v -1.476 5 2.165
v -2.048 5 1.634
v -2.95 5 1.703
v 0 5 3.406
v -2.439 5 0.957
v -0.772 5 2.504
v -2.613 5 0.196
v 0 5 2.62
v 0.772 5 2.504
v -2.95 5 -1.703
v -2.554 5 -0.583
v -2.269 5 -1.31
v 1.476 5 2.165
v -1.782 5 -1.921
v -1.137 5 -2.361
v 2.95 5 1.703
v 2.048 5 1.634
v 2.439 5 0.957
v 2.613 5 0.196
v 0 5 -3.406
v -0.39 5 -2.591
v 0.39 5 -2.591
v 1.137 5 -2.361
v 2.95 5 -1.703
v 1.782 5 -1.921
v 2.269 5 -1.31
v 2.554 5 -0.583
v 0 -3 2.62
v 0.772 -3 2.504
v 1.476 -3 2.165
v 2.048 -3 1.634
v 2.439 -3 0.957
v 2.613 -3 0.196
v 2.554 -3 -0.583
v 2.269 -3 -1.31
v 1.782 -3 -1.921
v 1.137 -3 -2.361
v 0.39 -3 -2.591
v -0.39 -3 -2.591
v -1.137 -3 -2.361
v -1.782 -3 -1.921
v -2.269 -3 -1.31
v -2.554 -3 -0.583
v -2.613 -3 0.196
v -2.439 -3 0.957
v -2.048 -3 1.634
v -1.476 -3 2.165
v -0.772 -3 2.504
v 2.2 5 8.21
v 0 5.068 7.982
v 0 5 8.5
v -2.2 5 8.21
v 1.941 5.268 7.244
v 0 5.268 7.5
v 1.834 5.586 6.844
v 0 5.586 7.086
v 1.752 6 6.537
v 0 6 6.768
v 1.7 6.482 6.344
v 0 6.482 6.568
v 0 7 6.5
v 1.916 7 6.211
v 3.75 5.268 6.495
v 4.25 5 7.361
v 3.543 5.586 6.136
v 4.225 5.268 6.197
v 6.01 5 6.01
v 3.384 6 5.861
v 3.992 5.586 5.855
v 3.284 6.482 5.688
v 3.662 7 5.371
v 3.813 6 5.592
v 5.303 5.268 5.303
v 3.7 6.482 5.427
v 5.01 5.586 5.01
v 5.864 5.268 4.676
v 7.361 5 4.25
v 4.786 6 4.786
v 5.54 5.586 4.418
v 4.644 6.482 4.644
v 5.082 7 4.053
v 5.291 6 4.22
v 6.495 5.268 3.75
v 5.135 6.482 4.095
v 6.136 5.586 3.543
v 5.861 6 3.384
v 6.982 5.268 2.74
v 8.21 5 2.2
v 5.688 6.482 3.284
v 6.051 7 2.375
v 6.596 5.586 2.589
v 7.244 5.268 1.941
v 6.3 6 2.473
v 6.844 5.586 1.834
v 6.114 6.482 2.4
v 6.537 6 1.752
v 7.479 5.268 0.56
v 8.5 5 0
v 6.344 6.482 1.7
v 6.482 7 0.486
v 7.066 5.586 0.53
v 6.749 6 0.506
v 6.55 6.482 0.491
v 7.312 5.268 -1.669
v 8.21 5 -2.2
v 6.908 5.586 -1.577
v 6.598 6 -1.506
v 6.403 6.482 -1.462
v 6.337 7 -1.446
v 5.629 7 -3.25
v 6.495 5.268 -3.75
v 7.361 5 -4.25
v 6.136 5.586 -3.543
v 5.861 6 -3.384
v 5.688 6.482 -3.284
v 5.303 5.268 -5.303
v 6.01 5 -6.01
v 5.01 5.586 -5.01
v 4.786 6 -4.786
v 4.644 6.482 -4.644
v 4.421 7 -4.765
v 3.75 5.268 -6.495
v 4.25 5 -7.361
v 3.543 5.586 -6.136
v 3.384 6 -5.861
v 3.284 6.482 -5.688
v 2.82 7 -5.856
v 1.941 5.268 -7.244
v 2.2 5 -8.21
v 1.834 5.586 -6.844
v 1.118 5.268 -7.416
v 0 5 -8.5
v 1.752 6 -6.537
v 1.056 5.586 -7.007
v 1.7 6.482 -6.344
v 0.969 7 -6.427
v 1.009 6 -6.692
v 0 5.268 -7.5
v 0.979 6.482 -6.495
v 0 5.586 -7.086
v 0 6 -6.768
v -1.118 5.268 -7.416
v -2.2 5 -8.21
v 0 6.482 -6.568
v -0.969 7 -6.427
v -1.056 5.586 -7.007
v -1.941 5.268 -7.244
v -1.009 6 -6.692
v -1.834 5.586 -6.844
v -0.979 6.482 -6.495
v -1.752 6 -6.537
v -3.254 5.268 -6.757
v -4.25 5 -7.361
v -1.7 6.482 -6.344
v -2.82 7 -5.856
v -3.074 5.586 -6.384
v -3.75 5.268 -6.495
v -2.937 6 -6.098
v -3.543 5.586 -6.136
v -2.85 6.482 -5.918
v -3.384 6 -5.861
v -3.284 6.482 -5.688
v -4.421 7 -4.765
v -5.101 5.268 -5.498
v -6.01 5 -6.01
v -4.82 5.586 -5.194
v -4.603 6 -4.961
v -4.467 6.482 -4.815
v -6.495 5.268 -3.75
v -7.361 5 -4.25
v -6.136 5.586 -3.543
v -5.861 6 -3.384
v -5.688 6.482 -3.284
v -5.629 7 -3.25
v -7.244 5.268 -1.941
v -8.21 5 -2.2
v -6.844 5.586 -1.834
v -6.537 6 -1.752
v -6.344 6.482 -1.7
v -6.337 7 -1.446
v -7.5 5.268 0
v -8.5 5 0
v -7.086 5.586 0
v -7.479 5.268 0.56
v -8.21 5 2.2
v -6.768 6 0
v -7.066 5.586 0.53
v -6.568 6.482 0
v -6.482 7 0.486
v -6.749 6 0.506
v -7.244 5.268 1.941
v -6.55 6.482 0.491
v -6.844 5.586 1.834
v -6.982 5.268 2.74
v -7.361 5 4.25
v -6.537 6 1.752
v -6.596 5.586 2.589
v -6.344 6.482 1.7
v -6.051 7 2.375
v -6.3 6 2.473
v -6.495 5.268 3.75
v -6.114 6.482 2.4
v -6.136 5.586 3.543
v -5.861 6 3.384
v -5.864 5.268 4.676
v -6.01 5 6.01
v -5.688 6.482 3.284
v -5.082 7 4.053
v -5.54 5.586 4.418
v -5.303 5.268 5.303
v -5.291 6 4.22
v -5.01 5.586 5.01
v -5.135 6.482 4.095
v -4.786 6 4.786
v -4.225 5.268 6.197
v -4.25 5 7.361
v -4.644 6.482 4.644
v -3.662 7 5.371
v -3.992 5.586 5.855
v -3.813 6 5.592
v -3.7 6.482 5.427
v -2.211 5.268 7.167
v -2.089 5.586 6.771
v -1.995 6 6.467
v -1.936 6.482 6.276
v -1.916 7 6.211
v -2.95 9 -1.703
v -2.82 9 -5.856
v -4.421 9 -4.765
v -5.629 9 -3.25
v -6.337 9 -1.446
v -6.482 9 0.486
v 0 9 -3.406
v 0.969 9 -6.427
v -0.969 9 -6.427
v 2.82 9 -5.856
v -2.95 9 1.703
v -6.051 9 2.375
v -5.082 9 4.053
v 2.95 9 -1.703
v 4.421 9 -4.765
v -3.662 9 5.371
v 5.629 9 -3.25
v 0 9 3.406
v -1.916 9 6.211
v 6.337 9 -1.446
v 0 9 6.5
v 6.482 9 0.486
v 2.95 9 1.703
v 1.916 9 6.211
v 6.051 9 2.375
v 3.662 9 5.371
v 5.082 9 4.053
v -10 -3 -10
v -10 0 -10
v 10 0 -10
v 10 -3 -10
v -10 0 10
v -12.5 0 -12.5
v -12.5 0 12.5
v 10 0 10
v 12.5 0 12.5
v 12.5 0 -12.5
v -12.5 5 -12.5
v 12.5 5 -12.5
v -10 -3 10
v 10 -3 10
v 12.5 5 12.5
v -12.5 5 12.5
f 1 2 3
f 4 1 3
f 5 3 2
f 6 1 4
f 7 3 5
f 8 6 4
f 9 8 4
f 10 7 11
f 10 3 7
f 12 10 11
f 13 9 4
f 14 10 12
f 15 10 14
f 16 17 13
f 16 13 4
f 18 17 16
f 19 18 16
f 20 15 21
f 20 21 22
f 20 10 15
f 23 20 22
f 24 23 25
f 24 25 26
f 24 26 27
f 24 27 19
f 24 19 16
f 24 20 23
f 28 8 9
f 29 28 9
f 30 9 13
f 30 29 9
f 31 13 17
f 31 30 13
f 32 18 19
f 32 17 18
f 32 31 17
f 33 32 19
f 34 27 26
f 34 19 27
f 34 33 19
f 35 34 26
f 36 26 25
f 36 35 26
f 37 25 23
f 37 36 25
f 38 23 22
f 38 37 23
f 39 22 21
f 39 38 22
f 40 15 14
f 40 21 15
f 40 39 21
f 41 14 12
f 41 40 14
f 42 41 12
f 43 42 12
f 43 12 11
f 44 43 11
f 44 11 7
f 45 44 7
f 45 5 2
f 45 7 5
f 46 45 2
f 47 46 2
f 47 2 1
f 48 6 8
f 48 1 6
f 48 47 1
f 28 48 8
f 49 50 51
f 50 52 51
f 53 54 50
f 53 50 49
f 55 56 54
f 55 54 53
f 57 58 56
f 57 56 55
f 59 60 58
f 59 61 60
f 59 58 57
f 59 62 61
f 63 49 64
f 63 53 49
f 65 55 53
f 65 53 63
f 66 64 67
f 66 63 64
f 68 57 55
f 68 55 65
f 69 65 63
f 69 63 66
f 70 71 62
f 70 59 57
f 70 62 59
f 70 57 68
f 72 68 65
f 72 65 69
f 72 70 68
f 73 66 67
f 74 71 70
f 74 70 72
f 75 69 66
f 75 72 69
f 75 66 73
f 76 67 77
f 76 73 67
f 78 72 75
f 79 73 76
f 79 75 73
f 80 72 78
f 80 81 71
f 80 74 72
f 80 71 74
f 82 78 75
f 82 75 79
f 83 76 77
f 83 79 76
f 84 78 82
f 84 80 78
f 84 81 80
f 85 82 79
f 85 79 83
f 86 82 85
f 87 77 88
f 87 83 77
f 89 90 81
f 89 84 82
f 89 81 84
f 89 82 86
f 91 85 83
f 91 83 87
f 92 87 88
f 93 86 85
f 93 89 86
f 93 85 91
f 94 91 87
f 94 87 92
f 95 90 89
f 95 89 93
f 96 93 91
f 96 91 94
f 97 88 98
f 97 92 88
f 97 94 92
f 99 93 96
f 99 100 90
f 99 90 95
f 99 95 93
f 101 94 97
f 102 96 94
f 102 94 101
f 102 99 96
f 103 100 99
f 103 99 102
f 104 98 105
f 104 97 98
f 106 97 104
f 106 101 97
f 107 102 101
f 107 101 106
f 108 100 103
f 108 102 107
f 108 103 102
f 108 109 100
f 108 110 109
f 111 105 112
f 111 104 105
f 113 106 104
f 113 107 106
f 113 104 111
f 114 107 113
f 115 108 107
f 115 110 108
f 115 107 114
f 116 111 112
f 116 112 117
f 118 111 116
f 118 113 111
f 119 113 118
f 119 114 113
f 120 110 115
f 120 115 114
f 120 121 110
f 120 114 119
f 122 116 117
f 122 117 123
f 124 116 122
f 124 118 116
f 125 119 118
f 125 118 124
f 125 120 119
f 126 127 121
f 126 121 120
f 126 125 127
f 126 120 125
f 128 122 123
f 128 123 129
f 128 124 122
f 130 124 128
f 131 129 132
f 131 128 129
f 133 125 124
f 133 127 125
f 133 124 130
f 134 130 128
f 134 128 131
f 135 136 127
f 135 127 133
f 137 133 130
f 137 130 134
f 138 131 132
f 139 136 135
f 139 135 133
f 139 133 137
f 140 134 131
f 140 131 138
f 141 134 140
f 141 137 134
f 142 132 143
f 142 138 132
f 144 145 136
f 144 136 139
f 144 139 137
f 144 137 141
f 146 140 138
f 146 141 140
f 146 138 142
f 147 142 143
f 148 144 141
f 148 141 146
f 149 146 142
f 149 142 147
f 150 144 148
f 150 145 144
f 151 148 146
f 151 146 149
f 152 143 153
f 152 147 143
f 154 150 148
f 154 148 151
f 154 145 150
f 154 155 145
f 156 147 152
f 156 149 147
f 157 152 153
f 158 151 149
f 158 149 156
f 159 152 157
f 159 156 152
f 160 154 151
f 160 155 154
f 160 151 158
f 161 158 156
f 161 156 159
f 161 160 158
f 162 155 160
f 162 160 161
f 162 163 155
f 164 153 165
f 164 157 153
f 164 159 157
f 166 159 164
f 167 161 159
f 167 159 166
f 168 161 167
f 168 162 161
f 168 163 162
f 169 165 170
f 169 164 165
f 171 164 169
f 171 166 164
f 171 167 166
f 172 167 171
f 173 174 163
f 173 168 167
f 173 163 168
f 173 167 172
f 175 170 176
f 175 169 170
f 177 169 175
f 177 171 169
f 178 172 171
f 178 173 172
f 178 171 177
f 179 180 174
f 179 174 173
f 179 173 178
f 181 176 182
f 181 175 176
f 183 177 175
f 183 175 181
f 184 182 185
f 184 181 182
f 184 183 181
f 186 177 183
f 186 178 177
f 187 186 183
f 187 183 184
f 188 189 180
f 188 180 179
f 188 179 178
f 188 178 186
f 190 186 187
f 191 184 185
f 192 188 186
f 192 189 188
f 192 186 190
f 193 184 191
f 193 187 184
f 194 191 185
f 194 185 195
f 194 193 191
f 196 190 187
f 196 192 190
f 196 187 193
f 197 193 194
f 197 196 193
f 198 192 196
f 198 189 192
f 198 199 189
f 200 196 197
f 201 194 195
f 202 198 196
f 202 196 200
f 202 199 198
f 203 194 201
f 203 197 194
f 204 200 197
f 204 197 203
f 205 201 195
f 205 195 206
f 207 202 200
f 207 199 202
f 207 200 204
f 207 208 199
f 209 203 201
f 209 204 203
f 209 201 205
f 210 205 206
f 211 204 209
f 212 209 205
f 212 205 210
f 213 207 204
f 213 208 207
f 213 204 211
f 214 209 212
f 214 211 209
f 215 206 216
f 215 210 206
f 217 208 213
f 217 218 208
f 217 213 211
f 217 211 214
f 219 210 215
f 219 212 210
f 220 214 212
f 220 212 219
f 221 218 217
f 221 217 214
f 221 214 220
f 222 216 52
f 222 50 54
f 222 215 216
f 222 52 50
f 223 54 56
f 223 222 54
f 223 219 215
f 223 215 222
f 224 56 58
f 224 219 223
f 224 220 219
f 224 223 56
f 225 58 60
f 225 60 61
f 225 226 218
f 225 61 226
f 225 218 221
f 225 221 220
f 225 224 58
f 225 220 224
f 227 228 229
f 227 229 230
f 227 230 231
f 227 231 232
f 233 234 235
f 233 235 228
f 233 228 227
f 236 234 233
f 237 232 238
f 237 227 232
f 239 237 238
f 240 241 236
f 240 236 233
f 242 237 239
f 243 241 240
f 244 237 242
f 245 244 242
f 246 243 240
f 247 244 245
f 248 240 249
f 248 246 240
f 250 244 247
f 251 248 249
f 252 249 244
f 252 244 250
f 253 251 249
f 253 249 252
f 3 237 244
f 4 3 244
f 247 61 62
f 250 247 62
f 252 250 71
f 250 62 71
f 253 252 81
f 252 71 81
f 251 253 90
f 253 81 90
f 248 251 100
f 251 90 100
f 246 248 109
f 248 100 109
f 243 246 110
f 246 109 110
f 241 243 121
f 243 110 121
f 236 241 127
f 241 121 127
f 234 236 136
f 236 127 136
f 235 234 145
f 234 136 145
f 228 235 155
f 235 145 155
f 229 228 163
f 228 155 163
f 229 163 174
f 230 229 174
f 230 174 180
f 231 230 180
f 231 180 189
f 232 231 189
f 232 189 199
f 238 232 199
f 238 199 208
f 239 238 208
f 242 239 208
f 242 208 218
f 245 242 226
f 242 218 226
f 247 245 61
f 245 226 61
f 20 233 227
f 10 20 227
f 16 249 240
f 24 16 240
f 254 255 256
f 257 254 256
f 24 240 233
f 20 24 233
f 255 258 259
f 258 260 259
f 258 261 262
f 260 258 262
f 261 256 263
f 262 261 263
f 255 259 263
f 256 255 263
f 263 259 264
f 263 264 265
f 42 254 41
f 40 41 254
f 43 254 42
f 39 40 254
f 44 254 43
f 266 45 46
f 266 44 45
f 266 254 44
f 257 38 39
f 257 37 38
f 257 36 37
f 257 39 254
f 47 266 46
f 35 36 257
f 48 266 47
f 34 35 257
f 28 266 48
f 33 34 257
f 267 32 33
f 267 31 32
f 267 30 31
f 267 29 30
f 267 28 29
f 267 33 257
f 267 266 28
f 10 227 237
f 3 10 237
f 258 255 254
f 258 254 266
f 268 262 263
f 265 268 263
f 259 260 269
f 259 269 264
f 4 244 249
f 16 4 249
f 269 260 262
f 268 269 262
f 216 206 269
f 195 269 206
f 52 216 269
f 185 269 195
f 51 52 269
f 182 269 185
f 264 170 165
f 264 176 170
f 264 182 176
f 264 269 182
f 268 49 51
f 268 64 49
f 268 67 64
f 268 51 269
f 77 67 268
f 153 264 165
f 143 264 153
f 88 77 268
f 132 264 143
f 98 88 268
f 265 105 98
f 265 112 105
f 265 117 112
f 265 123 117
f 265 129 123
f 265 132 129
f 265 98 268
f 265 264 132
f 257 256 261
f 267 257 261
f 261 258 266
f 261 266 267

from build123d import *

# Parameters (mm, degrees)
SKETCH2_W               = 25
SKETCH2_H               = 25
BOSS_EXTRUDE1_DEPTH     = 5
SKETCH3_W               = 20
SKETCH3_H               = 20
BOSS_EXTRUDE2_DEPTH     = 3
SKETCH4_R               = 6.5
BOSS_EXTRUDE3_DEPTH     = 4
CUT_EXTRUDE1_DEPTH      = 22.365860619
CUT_EXTRUDE1_DEPTH_BACK = 22.365860619
SKETCH5_R               = 2.62
CUT_EXTRUDE2_DEPTH      = 4
FILLET1_R               = 2


with BuildPart() as part:
    # Sketch2 → Boss-Extrude1 (new body)
    with BuildSketch(Plane(origin=(0, 0, 0), x_dir=(1, 0, 0), z_dir=(0, 1, 0))):
        Rectangle(SKETCH2_W, SKETCH2_H)
    extrude(amount=BOSS_EXTRUDE1_DEPTH)

    # Sketch3 → Boss-Extrude2 (add)
    with BuildSketch(Plane.XZ):
        Rectangle(SKETCH3_W, SKETCH3_H)
    extrude(amount=BOSS_EXTRUDE2_DEPTH)

    # Sketch4 → Boss-Extrude3 (add)
    with BuildSketch(Plane(origin=(0, 5, 0), x_dir=(1, 0, 0), z_dir=(0, 1, 0))):
        with Locations(Location((0, 0, 0), (0, 0, 270))):
            Circle(SKETCH4_R)
    extrude(amount=BOSS_EXTRUDE3_DEPTH)

    # Sketch5 → Cut-Extrude1 (cut, two sides: drawn at the far end of the back side and taken through both)
    with BuildSketch(Plane(origin=(0, 9, 0), x_dir=(1, 0, 0), z_dir=(0, 1, 0)).offset(-CUT_EXTRUDE1_DEPTH_BACK)):
        with Locations(Location((0, 0, 0), (0, 0, 270))):
            Circle(SKETCH5_R)
    extrude(amount=CUT_EXTRUDE1_DEPTH + CUT_EXTRUDE1_DEPTH_BACK, mode=Mode.SUBTRACT)

    # Sketch6 → Cut-Extrude2 (cut)
    with BuildSketch(Plane(origin=(0, 9, 0), x_dir=(1, 0, 0), z_dir=(0, 1, 0))):
        Polygon((0, 3.406366588), (-2.95, 1.703183294), (-2.95, -1.703183294), (0, -3.406366588), (2.95, -1.703183294), (2.95, 1.703183294), align=None)
    extrude(amount=-CUT_EXTRUDE2_DEPTH, mode=Mode.SUBTRACT)

    # Fillet1
    fillet1_edges = [part.edges().sort_by_distance(p)[0] for p in [
        (0, 5, -6.5),
    ]]
    fillet(fillet1_edges, radius=FILLET1_R)


solid = part.part
